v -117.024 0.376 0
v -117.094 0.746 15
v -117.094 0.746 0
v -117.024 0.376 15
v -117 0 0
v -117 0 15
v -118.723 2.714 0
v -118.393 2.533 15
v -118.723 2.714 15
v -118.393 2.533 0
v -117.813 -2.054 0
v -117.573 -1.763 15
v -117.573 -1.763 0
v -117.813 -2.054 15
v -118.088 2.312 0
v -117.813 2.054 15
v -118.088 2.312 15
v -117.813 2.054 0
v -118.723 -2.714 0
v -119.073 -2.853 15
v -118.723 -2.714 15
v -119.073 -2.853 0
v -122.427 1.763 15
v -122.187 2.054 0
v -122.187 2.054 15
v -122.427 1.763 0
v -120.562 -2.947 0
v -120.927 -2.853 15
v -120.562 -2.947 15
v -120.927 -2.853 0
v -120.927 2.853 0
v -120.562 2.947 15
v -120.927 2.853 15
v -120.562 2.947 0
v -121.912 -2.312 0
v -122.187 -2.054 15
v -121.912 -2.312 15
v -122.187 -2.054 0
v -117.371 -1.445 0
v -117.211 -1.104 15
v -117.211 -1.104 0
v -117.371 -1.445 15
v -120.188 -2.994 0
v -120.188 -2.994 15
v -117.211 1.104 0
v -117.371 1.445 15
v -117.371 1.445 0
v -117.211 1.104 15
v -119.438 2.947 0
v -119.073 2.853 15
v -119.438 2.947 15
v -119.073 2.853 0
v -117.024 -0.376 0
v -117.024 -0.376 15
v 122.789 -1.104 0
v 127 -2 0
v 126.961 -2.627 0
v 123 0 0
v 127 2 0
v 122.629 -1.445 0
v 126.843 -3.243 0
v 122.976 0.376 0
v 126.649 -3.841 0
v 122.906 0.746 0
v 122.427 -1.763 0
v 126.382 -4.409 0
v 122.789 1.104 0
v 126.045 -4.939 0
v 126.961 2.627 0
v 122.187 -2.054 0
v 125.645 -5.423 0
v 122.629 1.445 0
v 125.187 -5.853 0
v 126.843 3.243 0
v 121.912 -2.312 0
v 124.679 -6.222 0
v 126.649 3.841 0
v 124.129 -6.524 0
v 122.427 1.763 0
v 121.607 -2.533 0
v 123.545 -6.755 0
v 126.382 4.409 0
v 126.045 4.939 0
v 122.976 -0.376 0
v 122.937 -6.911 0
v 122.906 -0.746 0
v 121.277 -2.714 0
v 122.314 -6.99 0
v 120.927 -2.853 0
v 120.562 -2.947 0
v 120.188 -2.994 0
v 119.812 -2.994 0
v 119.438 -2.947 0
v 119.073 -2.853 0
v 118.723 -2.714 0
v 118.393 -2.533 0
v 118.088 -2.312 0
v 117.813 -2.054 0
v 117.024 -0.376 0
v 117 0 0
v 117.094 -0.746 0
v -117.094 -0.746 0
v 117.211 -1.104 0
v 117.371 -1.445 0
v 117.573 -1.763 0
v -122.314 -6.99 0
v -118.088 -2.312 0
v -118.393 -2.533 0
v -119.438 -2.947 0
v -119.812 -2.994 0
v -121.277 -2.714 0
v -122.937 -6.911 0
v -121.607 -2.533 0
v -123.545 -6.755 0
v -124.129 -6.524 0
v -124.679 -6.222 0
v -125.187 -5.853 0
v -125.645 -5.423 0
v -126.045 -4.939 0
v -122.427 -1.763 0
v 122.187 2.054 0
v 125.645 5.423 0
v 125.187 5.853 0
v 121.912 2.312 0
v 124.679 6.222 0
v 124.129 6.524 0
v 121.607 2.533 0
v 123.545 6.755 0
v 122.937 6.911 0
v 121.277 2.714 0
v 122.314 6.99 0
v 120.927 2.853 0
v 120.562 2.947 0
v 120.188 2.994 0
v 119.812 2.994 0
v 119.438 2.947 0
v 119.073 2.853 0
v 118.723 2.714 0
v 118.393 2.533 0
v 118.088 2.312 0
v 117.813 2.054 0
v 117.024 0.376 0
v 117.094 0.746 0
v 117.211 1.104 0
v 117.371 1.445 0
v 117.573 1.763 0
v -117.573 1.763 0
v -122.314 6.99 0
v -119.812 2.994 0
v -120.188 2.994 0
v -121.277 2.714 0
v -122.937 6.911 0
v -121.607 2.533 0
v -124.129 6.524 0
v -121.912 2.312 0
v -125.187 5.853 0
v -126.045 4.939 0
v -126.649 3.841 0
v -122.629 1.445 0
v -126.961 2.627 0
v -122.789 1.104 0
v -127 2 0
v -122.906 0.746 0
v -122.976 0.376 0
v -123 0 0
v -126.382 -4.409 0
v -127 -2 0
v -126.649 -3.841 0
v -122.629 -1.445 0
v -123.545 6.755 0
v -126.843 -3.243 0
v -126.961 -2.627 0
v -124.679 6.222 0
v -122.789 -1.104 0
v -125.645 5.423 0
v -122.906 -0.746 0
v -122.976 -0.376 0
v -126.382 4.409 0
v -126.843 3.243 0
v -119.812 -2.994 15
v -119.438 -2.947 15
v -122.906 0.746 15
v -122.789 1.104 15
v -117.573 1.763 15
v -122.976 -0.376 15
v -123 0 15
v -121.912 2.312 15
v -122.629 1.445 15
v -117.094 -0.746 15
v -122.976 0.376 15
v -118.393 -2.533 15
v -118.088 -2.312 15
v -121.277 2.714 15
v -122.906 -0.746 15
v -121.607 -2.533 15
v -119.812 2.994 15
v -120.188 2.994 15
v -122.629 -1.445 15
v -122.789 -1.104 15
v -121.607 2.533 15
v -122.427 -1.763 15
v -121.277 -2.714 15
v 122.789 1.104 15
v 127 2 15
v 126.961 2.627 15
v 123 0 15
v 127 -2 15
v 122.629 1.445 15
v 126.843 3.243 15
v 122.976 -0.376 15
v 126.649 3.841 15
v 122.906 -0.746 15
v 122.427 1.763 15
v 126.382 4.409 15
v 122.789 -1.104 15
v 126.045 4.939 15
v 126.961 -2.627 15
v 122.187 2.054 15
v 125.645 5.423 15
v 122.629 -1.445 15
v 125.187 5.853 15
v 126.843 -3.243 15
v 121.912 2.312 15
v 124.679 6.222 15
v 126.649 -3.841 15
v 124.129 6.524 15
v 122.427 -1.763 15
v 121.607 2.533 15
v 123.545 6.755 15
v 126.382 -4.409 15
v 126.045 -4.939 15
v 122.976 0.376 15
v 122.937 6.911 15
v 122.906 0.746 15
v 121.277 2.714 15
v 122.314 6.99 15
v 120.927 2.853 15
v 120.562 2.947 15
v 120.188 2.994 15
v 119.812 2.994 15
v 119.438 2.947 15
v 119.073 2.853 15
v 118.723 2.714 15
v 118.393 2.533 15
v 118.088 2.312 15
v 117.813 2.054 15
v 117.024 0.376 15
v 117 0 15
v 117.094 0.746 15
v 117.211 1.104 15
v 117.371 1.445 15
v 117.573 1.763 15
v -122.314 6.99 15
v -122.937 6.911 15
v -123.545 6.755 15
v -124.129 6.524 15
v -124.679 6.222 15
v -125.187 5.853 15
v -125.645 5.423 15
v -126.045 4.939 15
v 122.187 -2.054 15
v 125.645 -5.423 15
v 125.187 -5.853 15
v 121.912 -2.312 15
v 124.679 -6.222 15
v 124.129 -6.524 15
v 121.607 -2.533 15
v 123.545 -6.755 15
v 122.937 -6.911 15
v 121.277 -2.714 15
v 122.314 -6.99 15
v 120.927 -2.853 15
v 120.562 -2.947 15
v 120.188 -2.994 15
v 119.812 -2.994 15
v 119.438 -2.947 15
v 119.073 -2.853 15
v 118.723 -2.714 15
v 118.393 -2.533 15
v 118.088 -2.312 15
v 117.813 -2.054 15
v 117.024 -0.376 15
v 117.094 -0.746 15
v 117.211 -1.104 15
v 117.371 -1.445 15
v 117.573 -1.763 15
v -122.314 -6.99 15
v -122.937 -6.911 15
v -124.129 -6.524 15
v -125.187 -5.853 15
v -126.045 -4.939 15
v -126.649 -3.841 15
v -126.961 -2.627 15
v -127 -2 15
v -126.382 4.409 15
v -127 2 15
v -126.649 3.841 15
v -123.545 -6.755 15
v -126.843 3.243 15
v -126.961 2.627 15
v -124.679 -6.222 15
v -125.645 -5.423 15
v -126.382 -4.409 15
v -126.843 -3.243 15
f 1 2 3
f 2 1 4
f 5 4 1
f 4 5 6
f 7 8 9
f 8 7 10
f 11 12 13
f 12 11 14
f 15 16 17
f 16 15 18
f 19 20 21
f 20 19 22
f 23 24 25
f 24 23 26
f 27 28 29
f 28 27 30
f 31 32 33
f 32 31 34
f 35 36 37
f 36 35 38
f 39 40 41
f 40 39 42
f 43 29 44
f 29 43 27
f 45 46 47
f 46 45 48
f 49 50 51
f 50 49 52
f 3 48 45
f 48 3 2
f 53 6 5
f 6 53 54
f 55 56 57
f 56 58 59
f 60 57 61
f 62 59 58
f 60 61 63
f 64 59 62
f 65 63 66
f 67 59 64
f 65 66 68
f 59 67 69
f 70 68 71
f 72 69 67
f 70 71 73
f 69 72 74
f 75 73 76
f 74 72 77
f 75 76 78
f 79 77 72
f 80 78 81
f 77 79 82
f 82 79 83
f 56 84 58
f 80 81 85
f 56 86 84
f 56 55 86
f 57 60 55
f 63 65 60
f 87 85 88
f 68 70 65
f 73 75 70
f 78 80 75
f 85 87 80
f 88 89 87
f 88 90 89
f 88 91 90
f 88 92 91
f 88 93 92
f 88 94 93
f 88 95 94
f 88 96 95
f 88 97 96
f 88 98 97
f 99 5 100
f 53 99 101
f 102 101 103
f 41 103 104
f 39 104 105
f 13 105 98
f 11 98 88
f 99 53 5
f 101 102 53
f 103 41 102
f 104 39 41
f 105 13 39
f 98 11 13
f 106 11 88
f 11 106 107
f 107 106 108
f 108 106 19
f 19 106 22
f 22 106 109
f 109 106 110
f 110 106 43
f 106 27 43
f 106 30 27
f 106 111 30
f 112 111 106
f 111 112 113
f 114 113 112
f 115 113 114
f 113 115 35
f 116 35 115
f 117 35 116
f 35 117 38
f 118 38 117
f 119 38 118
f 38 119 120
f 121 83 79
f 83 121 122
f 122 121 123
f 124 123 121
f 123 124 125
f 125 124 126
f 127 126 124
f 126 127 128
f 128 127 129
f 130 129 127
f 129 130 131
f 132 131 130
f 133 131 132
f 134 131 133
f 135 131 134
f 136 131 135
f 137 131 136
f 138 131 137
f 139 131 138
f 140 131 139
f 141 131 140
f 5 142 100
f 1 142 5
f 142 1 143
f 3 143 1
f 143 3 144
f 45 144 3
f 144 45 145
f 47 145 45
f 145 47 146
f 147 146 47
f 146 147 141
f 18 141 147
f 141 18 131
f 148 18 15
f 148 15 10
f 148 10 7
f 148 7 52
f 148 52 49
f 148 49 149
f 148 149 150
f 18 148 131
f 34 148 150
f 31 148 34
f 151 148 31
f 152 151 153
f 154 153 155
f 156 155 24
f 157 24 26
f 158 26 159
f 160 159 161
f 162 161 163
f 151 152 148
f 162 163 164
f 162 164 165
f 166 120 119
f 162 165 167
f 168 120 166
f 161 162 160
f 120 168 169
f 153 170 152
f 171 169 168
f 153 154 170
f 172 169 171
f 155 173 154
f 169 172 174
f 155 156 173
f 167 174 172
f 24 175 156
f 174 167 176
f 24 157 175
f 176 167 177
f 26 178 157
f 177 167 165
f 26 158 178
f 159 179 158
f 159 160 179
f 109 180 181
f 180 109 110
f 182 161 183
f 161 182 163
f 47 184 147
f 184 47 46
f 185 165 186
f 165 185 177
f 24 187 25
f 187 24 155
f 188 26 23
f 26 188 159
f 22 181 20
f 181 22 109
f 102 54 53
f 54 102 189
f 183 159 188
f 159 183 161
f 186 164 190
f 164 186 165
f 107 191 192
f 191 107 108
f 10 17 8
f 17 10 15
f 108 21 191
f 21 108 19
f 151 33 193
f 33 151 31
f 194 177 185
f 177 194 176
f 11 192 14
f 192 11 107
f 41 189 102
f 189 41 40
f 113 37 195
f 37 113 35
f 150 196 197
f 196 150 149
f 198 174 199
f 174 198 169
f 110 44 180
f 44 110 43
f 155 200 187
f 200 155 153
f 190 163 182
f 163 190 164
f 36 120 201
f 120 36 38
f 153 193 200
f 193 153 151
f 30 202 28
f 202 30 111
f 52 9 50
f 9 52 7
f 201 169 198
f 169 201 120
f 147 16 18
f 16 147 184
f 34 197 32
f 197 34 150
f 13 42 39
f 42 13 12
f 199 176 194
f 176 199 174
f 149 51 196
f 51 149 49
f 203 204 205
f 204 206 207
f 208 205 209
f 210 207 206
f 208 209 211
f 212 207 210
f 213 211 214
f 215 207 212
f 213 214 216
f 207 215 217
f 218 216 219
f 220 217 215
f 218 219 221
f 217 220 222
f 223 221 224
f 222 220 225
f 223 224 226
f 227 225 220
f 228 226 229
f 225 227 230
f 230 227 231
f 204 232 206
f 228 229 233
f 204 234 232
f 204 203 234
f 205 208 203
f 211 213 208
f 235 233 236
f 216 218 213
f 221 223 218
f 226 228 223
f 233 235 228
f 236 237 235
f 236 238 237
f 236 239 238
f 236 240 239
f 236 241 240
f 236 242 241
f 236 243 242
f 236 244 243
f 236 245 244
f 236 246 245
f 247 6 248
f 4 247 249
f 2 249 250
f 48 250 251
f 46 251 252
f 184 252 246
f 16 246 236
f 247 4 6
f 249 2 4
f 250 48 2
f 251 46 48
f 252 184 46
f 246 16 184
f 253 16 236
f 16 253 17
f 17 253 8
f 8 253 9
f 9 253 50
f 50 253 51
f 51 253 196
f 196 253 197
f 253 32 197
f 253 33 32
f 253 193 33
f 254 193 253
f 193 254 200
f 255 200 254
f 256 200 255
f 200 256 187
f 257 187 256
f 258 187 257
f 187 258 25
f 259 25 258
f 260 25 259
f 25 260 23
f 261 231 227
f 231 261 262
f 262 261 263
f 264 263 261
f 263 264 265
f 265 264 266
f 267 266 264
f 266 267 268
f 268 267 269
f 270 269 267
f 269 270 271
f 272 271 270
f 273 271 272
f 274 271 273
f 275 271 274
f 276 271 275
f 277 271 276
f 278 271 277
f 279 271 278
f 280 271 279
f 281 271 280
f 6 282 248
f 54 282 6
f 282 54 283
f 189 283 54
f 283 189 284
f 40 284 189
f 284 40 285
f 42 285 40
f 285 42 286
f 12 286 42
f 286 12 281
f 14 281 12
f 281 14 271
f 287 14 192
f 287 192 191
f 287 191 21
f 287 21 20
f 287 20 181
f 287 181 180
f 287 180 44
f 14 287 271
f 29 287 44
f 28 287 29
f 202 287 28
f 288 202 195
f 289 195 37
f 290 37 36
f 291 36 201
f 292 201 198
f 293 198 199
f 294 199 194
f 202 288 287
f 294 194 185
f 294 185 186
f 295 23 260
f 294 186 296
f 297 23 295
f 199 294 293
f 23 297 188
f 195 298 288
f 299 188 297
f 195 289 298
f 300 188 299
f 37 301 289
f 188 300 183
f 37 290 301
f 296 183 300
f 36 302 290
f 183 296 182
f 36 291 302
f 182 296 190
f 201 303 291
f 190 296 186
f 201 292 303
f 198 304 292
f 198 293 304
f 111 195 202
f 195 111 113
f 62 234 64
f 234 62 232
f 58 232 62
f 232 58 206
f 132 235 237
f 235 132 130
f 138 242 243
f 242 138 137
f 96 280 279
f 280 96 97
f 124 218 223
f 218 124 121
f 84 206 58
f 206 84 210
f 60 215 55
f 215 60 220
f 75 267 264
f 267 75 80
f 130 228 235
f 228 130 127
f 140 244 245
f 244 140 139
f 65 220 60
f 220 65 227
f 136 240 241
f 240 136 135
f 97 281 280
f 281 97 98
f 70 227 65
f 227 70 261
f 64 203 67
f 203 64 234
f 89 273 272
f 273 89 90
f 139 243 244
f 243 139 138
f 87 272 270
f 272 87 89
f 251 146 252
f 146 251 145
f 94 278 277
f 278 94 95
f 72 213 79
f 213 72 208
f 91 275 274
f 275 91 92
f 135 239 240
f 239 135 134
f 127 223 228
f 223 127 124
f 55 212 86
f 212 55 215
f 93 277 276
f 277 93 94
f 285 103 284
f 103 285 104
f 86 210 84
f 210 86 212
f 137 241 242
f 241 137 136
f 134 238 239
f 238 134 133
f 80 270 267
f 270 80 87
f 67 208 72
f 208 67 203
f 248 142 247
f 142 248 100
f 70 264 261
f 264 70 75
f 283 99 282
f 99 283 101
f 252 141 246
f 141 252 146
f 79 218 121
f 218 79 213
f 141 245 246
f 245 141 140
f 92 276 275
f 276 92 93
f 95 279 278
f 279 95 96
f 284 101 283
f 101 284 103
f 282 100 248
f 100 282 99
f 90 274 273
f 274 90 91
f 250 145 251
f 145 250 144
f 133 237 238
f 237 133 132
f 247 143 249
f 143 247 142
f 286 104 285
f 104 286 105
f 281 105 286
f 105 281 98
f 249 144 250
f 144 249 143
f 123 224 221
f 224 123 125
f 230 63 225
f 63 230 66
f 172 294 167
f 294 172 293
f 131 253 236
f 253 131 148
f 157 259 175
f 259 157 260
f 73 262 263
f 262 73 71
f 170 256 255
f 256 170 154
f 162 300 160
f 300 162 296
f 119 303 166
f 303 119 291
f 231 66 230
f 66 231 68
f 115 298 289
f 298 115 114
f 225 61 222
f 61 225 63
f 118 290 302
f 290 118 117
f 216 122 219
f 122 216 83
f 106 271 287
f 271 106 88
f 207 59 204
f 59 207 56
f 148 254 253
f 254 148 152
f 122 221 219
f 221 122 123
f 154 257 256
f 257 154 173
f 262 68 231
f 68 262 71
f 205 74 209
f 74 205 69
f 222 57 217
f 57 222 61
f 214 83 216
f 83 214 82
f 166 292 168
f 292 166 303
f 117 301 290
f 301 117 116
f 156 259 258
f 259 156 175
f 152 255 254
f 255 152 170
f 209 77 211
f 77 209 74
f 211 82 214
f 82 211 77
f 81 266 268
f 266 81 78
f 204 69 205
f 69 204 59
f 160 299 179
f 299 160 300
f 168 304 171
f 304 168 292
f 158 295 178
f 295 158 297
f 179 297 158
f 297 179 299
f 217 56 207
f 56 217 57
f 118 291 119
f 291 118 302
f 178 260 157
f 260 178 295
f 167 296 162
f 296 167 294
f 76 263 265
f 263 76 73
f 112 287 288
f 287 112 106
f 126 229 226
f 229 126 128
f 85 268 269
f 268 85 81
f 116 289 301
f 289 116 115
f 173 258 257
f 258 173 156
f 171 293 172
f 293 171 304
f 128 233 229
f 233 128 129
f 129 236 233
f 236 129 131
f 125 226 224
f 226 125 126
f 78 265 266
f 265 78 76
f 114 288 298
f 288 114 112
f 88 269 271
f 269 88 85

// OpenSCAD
$fn = 50;


difference() {
	union() {
		hull() {
			translate(v = [-122.0000000000, 2.0000000000, 0]) {
				cylinder(h = 15, r = 5);
			}
			translate(v = [122.0000000000, 2.0000000000, 0]) {
				cylinder(h = 15, r = 5);
			}
			translate(v = [-122.0000000000, -2.0000000000, 0]) {
				cylinder(h = 15, r = 5);
			}
			translate(v = [122.0000000000, -2.0000000000, 0]) {
				cylinder(h = 15, r = 5);
			}
		}
	}
	union() {
		translate(v = [-120.0000000000, 0.0000000000, 0]) {
			cylinder(h = 15, r = 3.0000000000);
		}
		translate(v = [120.0000000000, 0.0000000000, 0]) {
			cylinder(h = 15, r = 3.0000000000);
		}
		translate(v = [-120.0000000000, 0.0000000000, 0]) {
			cylinder(h = 15, r = 1.5000000000);
		}
		translate(v = [120.0000000000, 0.0000000000, 0]) {
			cylinder(h = 15, r = 1.5000000000);
		}
		translate(v = [-120.0000000000, 0.0000000000, 0]) {
			cylinder(h = 15, r = 1.5000000000);
		}
		translate(v = [120.0000000000, 0.0000000000, 0]) {
			cylinder(h = 15, r = 1.5000000000);
		}
		translate(v = [-120.0000000000, 0.0000000000, 0]) {
			cylinder(h = 15, r = 1.5000000000);
		}
		translate(v = [120.0000000000, 0.0000000000, 0]) {
			cylinder(h = 15, r = 1.5000000000);
		}
	}
}
